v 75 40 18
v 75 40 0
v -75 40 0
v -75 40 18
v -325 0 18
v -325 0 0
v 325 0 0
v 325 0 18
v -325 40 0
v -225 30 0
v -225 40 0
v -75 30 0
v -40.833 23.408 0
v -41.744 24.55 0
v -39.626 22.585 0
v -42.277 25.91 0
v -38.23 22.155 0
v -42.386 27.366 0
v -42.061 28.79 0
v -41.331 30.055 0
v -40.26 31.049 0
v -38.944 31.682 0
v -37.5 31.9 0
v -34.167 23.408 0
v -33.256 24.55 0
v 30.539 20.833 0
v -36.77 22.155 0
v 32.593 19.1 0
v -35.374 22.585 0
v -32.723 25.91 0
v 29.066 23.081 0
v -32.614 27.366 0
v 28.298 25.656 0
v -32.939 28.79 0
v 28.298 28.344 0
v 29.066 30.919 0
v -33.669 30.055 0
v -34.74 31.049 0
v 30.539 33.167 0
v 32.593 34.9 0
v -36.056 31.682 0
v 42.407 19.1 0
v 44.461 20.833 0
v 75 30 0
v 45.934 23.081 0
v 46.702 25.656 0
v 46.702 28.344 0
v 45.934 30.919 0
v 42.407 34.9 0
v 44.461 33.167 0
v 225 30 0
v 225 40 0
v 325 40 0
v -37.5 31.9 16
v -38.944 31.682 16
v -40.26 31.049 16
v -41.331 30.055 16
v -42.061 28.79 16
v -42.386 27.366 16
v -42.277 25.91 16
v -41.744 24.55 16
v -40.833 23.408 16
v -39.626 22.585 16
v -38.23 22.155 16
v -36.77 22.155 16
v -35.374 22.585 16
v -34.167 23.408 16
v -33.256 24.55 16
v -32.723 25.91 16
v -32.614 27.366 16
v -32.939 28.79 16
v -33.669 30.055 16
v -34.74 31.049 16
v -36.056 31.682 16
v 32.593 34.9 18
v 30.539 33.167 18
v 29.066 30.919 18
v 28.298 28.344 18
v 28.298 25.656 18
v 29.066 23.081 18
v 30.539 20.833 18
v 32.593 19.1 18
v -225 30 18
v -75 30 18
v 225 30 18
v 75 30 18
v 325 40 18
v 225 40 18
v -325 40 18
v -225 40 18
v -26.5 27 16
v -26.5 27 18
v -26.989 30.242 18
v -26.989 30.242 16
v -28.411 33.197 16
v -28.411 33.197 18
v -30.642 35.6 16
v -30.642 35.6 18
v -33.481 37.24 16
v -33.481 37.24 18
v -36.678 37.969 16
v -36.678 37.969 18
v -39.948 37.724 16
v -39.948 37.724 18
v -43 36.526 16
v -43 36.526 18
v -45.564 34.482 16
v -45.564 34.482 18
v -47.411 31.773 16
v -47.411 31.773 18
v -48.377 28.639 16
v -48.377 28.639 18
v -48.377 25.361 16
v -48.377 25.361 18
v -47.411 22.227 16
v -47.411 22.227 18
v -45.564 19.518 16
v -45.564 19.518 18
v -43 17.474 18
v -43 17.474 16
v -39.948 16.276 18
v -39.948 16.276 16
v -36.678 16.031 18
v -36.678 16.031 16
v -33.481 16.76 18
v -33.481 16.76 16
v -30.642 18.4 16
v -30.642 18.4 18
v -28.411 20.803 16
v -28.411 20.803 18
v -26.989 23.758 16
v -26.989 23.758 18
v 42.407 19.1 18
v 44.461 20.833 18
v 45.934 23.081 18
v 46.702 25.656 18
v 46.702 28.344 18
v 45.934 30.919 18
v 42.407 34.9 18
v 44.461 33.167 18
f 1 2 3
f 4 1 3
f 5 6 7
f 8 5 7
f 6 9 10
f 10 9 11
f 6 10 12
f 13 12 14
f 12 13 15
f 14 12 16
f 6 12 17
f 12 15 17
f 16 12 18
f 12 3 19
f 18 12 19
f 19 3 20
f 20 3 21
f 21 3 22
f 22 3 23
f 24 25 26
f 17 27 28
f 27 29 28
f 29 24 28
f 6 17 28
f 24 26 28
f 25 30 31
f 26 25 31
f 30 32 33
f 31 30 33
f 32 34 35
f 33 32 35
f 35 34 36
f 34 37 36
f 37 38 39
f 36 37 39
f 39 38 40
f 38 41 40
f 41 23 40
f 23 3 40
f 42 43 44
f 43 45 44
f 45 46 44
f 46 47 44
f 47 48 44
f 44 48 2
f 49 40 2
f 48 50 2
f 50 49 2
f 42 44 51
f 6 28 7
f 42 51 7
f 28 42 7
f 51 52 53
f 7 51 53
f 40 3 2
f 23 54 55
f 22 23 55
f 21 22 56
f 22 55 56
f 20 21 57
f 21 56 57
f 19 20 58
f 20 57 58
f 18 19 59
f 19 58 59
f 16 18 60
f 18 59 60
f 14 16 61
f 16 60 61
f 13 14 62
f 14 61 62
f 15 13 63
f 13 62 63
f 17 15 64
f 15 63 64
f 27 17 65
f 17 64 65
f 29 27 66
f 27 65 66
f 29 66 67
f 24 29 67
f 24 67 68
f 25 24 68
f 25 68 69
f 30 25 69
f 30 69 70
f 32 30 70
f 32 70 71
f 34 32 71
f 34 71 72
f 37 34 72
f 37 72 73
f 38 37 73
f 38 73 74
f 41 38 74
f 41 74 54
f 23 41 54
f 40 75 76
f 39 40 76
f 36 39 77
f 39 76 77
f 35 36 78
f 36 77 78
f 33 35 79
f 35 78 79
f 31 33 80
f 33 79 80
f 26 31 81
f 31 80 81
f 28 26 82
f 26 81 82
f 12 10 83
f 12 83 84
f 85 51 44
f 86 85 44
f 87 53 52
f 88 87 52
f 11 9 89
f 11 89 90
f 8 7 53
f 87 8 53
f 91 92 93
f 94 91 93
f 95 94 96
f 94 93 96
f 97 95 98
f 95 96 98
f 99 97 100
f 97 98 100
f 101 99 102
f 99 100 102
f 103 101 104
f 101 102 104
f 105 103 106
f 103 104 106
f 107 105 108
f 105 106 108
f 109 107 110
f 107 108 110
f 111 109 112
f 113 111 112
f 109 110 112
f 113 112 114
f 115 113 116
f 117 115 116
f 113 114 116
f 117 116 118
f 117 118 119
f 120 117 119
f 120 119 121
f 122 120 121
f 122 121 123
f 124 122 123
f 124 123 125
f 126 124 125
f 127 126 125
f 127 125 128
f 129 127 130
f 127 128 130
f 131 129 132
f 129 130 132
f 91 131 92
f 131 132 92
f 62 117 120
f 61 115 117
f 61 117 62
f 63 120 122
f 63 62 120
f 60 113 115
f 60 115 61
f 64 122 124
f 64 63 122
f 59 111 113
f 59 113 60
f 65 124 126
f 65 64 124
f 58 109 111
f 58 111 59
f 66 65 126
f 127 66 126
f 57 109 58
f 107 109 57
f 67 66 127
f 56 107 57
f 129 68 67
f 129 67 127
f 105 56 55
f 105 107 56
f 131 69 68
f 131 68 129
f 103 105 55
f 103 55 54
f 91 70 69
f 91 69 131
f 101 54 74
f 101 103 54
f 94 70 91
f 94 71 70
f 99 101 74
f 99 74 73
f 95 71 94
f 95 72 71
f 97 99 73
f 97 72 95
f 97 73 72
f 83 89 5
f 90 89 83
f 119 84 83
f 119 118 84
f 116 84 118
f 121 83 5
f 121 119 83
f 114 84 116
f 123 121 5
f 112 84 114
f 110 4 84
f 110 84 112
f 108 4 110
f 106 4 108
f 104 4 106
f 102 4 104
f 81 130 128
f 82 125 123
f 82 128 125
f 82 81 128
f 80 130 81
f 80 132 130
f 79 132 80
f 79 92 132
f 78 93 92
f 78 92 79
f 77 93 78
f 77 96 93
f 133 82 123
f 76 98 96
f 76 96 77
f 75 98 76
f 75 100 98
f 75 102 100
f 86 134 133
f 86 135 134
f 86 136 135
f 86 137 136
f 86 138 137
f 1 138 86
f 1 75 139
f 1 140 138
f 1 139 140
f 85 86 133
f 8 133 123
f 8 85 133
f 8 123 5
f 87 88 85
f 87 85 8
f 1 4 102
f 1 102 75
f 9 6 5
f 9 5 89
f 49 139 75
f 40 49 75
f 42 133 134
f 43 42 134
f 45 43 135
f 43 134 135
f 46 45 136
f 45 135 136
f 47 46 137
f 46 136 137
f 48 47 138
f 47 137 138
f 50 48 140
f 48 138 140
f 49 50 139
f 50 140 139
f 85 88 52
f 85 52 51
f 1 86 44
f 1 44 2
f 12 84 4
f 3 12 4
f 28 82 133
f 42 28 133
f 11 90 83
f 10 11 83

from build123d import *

# Parameters (mm, degrees)
PAD_DEPTH          = 18
SKETCH001_R        = 11
SKETCH001_R_2      = 4.9
POCKET_DEPTH       = 2
POCKET001_DEPTH    = 20
POCKET001_FACE30_R = 4.9
POCKET002_DEPTH    = 20


with BuildPart() as part:
    # Sketch → Pad (new body)
    with BuildSketch(Plane.XY):
        Polygon((0, 0), (-325, 0), (-325, 40), (-225, 40), (-225, 30), (-75, 30), (-75, 40), (0, 40), align=None)
    pad = extrude(amount=PAD_DEPTH)

    # Mirrored: Pad across Sketch V_Axis
    add(pad.mirror(Plane(origin=(0, 0, 0), x_dir=(0, 0, 1), z_dir=(1, 0, 0))))

    # Sketch001 (on DatumPlane) → Pocket (cut)
    with BuildSketch(Plane.XY.offset(18)):
        with Locations((-37.5, 27)):
            Circle(SKETCH001_R)
        with Locations((-37.5, 27)):
            Circle(SKETCH001_R_2, mode=Mode.SUBTRACT)
        with BuildLine():
            ThreePointArc((32.592862, 34.9), (28.2, 27), (32.592862, 19.1))
            Line((32.592862, 19.1), (42.407138, 19.1))
            ThreePointArc((42.407138, 19.1), (46.8, 27), (42.407138, 34.9))
            Line((32.592862, 34.9), (42.407138, 34.9))
        make_face()
    extrude(amount=-POCKET_DEPTH, mode=Mode.SUBTRACT)

    # Pocket Face25 → Pocket001 (cut)
    with BuildSketch(Plane(origin=(37.5, 27, 16), x_dir=(0, 1, 0), z_dir=(0, 0, 1))):
        with BuildLine():
            ThreePointArc((7.9, 4.907138), (0, 9.3), (-7.9, 4.907138))
            Line((-7.9, 4.907138), (-7.9, -4.907138))
            ThreePointArc((-7.9, -4.907138), (0, -9.3), (7.9, -4.907138))
            Line((7.9, -4.907138), (7.9, 4.907138))
        make_face()
    extrude(amount=-POCKET001_DEPTH, mode=Mode.SUBTRACT)

    # Pocket001 Face30 → Pocket002 (cut)
    with BuildSketch(Plane(origin=(-37.5, 27, 18), x_dir=(0, 1, 0), z_dir=(0, 0, 1))):
        Circle(POCKET001_FACE30_R)
    extrude(amount=-POCKET002_DEPTH, mode=Mode.SUBTRACT)


solid = part.part
